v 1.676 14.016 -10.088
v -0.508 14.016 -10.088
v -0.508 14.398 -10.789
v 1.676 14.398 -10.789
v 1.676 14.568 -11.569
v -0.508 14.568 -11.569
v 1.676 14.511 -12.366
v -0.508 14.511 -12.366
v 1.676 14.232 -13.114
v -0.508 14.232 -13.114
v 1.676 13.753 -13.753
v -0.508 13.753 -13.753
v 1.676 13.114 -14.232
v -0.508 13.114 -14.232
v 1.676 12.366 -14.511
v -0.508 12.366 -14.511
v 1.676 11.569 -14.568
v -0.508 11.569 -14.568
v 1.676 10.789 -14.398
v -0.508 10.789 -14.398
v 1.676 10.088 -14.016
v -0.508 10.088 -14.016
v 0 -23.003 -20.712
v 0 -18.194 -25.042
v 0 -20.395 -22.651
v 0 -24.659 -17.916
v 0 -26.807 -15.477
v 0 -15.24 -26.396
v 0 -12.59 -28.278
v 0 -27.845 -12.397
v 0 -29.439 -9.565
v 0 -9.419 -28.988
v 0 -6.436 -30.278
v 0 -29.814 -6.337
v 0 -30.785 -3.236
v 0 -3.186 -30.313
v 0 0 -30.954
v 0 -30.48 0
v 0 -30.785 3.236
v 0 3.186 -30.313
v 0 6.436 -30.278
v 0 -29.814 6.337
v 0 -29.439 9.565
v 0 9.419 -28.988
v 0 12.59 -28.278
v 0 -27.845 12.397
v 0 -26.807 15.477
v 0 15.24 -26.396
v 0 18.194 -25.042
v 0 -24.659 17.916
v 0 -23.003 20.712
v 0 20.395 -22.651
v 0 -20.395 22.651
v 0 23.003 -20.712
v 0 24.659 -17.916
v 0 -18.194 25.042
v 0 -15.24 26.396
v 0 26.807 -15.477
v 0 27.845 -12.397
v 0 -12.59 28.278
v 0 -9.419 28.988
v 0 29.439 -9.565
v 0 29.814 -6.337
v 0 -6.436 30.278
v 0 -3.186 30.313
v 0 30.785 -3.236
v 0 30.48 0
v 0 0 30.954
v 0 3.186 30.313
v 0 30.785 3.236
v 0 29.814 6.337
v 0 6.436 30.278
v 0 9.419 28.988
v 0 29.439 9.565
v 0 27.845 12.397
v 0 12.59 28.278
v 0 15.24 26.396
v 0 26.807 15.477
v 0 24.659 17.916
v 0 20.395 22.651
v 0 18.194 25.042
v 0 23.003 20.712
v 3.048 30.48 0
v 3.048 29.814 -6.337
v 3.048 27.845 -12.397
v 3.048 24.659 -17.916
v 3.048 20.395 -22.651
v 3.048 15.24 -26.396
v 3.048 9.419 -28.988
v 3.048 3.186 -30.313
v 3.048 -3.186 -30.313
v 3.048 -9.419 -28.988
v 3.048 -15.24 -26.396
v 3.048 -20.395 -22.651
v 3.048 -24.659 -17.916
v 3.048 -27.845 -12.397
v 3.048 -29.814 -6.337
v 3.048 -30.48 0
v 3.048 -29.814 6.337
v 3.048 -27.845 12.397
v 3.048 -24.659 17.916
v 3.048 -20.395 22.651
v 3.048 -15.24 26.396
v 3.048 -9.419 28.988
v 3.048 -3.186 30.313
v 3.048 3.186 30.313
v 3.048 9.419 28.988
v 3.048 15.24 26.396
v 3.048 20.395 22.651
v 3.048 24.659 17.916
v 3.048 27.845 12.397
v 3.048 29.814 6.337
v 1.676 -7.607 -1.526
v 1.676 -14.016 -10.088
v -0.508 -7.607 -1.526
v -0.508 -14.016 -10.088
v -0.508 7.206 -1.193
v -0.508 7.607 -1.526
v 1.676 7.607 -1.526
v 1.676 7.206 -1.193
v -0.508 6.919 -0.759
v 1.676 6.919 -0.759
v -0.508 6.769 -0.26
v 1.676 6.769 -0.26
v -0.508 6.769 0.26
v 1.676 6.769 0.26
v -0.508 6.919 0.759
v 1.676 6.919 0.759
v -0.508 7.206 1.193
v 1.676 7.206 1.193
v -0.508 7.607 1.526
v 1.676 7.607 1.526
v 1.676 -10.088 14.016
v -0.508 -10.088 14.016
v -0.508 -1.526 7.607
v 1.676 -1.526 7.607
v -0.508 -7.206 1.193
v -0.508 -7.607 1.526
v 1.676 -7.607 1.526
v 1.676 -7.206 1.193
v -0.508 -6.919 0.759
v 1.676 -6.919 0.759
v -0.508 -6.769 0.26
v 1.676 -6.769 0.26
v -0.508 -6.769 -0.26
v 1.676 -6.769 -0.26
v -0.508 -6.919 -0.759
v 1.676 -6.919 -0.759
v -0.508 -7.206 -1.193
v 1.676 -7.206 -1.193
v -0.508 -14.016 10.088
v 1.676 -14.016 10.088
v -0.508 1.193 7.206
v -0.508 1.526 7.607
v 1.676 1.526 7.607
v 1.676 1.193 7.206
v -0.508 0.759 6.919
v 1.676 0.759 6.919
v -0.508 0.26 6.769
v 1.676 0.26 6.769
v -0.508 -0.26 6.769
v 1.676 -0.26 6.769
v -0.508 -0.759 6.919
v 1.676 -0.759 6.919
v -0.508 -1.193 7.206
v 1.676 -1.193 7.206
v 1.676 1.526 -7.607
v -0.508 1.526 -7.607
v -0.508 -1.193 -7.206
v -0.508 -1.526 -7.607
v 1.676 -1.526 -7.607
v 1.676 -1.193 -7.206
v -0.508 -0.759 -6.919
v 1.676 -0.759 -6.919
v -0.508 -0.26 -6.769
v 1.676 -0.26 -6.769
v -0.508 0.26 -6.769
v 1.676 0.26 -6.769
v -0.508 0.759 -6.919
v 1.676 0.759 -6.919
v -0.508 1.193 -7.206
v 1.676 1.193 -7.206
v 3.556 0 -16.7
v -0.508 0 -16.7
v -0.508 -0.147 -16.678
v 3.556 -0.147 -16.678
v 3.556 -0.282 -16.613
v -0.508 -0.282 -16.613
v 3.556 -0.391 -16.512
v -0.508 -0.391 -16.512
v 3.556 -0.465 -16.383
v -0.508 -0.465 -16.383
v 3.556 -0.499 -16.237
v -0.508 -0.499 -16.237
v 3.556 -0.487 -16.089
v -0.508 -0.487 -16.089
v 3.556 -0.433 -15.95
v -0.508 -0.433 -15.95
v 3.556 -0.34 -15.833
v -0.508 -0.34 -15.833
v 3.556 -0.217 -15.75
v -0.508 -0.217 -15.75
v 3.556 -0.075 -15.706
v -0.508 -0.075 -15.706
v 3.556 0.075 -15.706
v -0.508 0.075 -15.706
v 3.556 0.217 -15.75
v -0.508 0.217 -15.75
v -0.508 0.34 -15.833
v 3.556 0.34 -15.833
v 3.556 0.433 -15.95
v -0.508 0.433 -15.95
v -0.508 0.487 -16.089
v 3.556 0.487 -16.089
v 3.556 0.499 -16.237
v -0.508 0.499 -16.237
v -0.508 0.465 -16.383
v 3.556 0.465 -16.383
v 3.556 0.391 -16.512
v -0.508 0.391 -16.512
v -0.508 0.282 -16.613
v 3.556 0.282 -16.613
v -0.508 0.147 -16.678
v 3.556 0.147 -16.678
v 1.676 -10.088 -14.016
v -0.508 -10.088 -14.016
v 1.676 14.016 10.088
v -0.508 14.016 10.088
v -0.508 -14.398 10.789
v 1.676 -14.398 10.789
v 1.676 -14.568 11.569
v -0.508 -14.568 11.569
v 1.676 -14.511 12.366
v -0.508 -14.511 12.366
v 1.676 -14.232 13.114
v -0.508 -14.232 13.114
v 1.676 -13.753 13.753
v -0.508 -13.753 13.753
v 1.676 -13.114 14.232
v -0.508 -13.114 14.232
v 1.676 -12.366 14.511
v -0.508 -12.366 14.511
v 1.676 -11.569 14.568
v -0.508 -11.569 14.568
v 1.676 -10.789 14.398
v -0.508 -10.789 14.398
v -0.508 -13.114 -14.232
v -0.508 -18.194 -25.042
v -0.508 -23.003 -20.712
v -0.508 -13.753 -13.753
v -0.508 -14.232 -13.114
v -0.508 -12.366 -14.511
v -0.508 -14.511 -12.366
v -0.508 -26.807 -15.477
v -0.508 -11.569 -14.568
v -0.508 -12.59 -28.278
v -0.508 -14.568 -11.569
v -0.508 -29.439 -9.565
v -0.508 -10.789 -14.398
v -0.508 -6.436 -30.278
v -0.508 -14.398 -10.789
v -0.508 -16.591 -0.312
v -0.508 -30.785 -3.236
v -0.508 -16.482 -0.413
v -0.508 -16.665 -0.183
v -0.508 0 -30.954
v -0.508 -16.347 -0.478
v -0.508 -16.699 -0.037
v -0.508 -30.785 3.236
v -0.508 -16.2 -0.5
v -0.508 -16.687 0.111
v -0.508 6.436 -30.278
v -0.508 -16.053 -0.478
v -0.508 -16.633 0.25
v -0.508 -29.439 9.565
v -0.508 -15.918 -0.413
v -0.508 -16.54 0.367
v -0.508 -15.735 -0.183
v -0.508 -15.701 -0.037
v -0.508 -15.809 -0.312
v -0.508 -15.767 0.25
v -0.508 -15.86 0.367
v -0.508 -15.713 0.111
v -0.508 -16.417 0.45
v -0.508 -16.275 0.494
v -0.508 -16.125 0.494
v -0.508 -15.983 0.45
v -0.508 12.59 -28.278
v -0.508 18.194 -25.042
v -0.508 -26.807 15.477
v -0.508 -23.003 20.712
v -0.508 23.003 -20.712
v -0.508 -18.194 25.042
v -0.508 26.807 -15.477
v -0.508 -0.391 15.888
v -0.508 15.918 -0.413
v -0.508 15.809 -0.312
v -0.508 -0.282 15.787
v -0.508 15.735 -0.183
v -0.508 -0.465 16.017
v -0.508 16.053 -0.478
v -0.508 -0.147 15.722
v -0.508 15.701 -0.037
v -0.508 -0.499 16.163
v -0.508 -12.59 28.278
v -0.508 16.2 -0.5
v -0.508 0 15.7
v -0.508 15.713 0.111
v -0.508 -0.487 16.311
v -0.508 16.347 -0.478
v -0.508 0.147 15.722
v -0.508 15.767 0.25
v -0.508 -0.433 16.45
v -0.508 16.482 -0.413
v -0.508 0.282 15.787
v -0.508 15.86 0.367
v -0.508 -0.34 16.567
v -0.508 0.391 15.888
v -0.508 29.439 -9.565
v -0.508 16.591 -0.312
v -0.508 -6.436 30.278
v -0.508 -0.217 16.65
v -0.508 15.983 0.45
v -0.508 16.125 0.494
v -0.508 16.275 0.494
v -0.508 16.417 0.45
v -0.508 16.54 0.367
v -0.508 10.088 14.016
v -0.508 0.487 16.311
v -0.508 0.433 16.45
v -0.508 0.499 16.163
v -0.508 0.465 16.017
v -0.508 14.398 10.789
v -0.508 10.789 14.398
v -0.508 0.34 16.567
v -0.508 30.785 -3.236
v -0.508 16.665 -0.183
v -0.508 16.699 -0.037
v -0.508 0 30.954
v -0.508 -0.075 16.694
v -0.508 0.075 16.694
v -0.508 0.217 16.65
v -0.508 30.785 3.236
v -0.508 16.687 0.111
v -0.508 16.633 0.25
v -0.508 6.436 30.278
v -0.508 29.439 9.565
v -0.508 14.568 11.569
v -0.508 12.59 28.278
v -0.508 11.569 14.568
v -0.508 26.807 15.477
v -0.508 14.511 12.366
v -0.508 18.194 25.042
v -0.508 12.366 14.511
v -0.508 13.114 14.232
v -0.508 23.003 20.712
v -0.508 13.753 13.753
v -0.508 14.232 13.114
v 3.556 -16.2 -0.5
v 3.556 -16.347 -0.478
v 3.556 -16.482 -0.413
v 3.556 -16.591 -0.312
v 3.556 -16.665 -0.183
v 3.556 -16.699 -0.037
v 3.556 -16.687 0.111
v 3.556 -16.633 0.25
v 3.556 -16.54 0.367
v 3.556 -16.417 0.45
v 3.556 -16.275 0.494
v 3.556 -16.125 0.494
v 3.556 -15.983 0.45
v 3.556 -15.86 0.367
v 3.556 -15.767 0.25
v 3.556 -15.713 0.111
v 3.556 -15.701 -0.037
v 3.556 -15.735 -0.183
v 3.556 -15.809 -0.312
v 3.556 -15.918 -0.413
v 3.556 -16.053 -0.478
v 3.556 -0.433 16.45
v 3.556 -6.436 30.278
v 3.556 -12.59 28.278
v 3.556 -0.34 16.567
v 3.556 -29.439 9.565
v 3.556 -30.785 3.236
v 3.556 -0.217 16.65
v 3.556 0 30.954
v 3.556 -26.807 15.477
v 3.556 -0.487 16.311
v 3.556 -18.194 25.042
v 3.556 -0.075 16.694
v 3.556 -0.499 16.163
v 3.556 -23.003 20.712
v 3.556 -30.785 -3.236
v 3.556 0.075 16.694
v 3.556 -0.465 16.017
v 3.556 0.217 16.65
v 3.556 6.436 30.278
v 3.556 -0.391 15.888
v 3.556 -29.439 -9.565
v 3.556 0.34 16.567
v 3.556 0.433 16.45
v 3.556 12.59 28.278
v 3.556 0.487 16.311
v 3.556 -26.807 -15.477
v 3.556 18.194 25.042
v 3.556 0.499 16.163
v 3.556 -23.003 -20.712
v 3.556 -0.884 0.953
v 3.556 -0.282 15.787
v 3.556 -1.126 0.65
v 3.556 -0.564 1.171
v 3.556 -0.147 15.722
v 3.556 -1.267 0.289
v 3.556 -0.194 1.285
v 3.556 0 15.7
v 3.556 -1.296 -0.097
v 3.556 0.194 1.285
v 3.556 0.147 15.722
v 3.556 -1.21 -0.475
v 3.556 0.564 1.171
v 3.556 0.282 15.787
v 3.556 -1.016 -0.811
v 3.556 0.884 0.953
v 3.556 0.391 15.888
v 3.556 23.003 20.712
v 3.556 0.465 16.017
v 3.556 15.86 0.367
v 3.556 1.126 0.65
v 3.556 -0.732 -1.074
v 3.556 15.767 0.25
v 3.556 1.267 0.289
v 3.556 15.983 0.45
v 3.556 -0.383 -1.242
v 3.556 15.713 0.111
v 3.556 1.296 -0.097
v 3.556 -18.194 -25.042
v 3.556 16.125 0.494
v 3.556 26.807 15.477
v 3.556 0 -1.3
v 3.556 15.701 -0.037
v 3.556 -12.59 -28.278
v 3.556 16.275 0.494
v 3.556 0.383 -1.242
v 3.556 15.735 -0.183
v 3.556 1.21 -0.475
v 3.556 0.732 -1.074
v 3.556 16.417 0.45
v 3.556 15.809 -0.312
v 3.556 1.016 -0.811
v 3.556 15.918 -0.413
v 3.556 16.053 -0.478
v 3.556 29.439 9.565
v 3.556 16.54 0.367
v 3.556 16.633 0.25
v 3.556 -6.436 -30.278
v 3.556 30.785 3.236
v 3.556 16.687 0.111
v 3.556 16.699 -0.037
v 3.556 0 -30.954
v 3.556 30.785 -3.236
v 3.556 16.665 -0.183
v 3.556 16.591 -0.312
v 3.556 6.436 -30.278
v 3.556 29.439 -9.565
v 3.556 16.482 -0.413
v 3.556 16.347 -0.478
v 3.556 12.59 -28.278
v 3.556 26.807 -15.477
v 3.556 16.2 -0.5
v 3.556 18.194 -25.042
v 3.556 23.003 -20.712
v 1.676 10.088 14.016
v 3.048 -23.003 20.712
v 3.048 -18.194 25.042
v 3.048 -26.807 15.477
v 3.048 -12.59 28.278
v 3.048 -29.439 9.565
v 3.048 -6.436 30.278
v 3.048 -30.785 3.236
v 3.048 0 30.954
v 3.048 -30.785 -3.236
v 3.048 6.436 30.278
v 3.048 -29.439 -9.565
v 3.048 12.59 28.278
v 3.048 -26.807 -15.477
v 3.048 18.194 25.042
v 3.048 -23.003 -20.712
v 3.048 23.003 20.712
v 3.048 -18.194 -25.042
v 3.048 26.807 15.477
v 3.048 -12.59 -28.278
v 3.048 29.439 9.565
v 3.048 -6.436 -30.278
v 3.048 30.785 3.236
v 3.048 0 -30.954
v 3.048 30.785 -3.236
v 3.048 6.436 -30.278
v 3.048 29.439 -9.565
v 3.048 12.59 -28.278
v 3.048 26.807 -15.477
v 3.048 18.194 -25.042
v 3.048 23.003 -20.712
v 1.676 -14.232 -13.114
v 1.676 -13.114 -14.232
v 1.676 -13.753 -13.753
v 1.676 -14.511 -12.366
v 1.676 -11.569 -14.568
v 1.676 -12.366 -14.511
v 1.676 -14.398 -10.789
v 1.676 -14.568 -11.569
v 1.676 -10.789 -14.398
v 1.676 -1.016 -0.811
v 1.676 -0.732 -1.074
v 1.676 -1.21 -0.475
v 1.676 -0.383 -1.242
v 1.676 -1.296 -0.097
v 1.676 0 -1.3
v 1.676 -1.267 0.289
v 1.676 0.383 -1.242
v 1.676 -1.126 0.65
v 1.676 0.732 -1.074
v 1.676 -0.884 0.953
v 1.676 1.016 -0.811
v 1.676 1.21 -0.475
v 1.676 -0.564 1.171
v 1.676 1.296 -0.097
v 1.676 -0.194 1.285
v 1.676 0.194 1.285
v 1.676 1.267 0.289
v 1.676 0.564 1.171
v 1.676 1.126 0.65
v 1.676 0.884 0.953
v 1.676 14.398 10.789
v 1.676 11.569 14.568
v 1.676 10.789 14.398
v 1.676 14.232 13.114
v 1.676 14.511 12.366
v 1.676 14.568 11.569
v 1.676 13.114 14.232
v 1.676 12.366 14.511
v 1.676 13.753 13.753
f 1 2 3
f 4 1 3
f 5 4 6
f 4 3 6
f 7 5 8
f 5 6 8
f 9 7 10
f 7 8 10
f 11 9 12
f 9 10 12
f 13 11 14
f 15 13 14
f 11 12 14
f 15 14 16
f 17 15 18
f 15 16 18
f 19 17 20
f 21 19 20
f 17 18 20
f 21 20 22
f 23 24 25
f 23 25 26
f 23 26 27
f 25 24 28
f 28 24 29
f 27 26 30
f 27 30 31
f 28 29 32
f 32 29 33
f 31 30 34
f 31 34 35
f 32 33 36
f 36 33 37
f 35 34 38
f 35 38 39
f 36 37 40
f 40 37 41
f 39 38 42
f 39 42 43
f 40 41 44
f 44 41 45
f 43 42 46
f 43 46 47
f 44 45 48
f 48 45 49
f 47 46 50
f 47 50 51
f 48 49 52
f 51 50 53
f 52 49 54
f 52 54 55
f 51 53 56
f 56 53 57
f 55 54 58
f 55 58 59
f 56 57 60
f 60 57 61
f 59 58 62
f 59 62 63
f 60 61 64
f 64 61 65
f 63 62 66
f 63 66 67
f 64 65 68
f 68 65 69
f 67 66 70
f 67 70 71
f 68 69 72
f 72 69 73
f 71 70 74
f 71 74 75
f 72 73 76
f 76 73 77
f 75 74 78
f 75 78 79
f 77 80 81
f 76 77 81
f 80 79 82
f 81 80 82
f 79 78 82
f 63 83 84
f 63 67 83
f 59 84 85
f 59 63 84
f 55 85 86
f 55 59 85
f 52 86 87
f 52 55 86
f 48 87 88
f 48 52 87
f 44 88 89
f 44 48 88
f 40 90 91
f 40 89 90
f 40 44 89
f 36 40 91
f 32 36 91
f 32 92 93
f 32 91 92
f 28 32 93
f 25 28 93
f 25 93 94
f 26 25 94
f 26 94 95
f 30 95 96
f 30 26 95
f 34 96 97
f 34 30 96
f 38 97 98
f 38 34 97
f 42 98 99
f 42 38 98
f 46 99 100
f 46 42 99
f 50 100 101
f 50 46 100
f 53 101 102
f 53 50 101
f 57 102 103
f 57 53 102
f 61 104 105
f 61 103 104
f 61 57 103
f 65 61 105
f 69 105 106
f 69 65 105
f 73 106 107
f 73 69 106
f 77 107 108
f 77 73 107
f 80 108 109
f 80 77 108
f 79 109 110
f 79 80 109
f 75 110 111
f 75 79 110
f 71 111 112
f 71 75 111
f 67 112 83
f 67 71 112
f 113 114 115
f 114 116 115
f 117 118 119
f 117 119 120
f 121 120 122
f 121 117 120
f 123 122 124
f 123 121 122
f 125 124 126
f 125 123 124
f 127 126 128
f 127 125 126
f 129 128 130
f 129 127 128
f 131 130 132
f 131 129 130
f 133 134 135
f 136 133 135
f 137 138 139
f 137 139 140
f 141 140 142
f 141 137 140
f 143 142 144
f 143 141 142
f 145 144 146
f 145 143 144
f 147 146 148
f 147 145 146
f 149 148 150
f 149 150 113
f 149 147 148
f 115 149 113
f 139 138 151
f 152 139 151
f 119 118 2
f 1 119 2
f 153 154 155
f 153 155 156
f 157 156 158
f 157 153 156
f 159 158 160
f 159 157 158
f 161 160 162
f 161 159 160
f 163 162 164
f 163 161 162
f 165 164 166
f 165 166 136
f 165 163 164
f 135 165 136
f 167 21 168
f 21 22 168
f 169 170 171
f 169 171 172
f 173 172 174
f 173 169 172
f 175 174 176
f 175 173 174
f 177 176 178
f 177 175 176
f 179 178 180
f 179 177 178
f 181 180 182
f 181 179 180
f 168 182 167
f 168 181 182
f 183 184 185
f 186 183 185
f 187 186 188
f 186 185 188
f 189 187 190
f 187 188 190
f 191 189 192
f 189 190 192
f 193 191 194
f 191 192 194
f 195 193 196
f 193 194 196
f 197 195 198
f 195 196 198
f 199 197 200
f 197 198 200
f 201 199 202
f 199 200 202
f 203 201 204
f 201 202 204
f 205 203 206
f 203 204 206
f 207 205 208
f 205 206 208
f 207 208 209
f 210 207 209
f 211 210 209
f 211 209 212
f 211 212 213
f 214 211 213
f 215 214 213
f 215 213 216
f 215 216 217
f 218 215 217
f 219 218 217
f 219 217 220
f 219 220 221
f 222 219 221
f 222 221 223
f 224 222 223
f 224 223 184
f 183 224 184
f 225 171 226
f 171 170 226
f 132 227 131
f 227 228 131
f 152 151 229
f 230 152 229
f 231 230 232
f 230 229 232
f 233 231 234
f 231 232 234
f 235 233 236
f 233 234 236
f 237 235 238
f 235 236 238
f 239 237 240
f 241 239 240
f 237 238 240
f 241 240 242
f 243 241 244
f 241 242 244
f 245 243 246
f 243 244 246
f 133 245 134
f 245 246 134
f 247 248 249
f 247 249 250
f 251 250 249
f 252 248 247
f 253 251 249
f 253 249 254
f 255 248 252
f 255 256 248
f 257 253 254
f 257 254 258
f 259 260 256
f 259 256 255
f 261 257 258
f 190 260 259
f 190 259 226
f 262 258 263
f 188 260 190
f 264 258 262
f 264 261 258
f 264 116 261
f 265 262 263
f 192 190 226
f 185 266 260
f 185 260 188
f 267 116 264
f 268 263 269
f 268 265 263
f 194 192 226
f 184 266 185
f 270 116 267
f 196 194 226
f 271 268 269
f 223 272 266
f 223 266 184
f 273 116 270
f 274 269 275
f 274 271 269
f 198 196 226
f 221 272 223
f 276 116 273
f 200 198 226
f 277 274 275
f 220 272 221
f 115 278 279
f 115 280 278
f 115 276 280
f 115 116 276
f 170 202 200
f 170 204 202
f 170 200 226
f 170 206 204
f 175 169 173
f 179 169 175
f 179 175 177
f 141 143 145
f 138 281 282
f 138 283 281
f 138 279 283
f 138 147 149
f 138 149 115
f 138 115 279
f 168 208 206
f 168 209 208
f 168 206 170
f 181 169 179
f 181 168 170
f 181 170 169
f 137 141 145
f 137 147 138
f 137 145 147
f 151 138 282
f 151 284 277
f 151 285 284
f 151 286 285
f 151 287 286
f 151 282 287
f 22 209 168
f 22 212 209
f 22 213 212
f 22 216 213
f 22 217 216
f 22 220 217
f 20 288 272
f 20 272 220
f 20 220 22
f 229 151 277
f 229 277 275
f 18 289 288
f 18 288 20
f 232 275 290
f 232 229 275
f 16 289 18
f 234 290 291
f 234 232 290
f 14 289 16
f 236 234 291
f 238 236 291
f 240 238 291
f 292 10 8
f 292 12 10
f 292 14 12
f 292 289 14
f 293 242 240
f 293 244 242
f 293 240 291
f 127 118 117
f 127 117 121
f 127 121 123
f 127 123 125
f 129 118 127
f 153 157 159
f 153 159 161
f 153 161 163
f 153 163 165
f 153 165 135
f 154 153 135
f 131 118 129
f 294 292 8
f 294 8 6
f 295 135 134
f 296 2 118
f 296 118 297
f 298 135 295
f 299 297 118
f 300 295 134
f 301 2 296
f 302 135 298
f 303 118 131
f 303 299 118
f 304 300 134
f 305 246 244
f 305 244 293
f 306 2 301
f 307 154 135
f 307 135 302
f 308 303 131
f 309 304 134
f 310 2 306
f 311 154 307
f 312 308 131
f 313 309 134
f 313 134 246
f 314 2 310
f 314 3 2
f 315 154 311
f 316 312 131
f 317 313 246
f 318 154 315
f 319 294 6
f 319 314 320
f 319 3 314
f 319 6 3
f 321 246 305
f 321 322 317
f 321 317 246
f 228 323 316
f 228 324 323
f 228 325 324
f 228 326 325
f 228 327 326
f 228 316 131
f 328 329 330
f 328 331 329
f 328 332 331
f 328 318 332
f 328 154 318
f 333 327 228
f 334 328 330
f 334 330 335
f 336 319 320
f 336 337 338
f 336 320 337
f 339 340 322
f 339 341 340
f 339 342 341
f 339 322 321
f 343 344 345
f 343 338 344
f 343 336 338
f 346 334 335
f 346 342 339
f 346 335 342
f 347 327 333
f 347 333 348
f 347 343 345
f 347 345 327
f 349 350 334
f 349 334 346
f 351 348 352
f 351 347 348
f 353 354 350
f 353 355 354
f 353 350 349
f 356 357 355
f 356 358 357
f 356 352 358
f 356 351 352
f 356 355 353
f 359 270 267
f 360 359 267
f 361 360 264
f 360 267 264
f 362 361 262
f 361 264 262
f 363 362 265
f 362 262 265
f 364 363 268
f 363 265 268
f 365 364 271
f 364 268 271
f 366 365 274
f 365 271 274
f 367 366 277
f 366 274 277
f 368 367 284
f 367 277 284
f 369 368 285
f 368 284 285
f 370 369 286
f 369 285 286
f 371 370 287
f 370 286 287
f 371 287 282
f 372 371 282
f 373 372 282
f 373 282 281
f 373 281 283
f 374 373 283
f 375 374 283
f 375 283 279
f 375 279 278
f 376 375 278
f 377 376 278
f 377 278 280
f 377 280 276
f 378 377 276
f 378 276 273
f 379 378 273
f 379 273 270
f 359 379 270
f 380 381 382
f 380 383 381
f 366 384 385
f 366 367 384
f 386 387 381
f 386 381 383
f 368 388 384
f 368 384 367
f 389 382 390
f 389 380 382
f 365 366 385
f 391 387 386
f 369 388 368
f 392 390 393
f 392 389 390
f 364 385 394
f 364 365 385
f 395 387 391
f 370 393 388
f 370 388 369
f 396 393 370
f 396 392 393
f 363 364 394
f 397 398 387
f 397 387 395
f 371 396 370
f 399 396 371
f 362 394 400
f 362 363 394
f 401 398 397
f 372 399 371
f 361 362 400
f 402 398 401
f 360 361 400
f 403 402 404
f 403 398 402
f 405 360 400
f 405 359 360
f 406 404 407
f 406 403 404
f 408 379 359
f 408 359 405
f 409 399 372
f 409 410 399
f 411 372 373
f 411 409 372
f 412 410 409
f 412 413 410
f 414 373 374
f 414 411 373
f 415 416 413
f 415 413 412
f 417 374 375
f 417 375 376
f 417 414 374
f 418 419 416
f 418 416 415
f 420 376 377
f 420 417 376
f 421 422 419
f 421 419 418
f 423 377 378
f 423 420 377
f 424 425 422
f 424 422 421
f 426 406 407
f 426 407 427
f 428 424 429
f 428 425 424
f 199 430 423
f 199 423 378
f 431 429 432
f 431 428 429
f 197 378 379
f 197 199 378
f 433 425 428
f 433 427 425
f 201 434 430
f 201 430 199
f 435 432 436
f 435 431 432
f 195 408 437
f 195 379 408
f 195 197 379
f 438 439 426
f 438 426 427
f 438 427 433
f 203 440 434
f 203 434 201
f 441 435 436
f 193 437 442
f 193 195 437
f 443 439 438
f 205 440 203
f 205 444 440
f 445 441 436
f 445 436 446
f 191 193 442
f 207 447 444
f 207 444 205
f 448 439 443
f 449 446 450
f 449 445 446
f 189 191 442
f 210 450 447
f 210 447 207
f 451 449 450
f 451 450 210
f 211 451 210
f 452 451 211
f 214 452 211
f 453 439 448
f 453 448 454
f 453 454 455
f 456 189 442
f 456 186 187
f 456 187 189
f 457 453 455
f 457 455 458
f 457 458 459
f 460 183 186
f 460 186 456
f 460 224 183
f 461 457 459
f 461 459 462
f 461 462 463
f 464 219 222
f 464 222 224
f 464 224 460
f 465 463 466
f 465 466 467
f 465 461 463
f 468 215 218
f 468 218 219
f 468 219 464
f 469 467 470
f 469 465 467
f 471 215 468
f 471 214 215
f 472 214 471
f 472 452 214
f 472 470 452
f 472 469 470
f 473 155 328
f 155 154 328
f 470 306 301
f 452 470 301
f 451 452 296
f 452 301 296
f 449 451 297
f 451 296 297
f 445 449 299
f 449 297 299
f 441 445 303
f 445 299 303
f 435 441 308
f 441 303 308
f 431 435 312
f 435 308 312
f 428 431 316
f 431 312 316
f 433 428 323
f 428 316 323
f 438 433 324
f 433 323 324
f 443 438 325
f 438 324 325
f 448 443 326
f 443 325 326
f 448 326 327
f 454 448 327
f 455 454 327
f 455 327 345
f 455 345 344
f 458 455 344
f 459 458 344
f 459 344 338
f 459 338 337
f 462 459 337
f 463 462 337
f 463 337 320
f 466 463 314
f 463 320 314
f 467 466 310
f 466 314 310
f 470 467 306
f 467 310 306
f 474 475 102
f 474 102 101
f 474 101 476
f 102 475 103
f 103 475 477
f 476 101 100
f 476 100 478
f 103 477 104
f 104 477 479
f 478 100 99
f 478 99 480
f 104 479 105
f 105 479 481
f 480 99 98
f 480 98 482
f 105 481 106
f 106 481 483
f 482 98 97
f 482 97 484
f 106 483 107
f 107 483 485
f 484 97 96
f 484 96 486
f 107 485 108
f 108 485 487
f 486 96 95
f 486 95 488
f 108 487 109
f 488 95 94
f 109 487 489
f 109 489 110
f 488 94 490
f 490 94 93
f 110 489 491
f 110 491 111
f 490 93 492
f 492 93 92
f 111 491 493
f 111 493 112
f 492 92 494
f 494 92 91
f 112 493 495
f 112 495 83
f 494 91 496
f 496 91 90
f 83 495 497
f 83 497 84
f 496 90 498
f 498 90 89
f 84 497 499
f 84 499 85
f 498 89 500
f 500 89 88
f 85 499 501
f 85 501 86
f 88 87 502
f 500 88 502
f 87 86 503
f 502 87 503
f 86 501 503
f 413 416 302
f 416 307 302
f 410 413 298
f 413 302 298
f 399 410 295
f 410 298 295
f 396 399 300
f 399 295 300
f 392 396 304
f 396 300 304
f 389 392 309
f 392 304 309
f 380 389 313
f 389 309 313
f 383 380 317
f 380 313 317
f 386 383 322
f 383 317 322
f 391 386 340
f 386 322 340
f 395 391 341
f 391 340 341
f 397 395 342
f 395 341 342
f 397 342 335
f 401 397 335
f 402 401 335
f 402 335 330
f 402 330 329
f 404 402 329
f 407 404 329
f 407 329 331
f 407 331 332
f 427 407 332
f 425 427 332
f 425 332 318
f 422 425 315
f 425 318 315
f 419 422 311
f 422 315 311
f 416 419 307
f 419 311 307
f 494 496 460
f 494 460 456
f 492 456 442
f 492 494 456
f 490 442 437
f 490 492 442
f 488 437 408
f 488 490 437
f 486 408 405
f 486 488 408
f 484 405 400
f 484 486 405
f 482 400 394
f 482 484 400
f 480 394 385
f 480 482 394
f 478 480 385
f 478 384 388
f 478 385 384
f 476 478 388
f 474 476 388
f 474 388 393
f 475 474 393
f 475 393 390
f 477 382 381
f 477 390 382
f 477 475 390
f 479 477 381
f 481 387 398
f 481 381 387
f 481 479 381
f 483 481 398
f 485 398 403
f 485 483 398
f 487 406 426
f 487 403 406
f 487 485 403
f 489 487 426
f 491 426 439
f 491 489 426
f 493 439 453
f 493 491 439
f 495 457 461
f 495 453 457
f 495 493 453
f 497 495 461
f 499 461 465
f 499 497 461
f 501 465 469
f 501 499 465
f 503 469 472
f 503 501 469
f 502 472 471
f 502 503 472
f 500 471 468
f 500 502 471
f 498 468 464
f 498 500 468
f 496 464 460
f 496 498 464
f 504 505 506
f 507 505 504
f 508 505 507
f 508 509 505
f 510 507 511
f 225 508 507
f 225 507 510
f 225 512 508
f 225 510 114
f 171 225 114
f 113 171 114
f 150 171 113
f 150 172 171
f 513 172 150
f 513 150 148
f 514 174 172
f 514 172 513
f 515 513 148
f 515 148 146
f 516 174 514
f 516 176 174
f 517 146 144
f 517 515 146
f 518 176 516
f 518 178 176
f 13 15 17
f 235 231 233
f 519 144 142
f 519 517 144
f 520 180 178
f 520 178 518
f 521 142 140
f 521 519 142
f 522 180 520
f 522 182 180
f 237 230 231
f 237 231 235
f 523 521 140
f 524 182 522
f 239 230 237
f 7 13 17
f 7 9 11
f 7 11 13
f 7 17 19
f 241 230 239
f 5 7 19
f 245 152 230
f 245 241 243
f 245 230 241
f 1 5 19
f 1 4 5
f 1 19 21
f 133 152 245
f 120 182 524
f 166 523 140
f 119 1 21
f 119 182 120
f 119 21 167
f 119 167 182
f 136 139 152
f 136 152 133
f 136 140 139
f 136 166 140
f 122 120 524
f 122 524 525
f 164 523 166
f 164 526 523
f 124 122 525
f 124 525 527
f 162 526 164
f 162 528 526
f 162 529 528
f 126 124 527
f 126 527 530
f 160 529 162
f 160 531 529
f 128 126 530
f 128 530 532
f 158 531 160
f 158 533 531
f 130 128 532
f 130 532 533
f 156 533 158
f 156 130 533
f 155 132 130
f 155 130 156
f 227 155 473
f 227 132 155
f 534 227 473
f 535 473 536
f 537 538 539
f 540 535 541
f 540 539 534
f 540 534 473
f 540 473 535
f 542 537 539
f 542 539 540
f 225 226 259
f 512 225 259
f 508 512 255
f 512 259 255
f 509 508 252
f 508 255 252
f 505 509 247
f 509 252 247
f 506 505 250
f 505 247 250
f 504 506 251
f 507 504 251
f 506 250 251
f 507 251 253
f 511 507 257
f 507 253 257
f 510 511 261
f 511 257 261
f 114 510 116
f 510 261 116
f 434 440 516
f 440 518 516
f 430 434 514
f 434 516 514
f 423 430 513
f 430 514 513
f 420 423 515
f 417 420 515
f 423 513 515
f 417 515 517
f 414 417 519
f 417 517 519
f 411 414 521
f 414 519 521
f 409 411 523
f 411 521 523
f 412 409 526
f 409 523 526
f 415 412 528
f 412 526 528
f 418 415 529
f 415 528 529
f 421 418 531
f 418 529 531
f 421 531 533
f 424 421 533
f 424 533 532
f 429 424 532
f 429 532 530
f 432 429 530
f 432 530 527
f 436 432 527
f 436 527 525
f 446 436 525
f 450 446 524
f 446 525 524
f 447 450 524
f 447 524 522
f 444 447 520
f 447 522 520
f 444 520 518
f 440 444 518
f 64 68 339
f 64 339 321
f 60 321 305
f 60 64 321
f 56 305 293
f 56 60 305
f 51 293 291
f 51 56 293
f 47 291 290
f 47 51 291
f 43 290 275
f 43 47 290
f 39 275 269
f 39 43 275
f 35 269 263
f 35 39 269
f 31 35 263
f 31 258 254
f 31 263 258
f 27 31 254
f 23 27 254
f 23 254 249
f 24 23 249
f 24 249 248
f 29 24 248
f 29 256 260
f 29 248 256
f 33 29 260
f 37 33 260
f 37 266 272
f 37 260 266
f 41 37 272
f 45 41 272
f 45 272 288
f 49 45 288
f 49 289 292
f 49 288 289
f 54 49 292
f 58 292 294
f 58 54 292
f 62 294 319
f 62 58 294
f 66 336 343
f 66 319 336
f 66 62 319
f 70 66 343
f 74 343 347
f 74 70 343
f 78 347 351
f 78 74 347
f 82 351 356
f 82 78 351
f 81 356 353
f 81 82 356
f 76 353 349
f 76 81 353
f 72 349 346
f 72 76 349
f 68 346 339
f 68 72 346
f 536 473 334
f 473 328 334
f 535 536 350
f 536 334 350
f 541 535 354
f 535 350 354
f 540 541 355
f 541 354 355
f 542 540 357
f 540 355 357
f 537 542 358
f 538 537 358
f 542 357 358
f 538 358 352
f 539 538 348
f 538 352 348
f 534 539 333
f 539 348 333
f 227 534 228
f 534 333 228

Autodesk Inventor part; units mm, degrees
ref_plane "YZ Plane" through (0, 0, 0) normal (1, 0, 0) x (0, 1, 0)
ref_plane "XZ Plane" through (0, 0, 0) normal (0, 1, 0) x (-1, 0, 0)
ref_plane "XY Plane" through (0, 0, 0) normal (0, 0, 1) x (1, 0, 0)
sketch "Sketch1" plane through (0, 0, 0) normal (1, 0, 0) x (0, 1, 0)
  circle A0 centre (0, 0) radius 30.48
  dimension "d0" = 60.96
extrude "Extrusion1" add sketch "Sketch1" along normal blind 3.048
sketch "Sketch2" plane through (3.048, 0, 0) normal (1, 0, 0) x (0, 0, -1)
  circle A0 centre (0, 0) radius 30.9541
extrude "Extrusion2" add sketch "Sketch2" along normal blind 0.508
sketch "Sketch3" plane through (0, 0, 0) normal (-1, 0, 0) x (0, 0, 1)
  circle A0 centre (0, 0) radius 30.9541
extrude "Extrusion3" add sketch "Sketch3" along normal blind 0.508
sketch "Sketch4" plane through (3.556, 0, 0) normal (1, 0, 0) x (0, 0, -1)
  circle A0 centre (0, 0) radius 1.3
  dimension "d7" = 2.6
hole "Hole1" at (3.556, 0, 0) direction (-1, 0, 0) diameter 2.6 end through all
sketch "Sketch5" plane through (3.556, 0, 0) normal (1, 0, 0) x (0, 0, -1)
  circle A0 centre (0, 0) radius 1.3 projected
  circle A1 centre (-16.2, 0) radius 0.5
  circle A2 centre (0, 16.2) radius 0.5
  circle A3 centre (16.2, 0) radius 0.5
  circle A4 centre (0, -16.2) radius 0.5
  dimension "d19" = 1
  dimension "d20" = 1
  dimension "d21" = 1
  dimension "d22" = 1
hole "Hole2" at (3.556, 16.2, 0) at (3.556, -16.2, 0) at (3.556, 0, -16.2) at (3.556, 0, 16.2) direction (-1, 0, 0) diameter 1 end through all
sketch "Sketch6" plane through (-0.508, 0, 0) normal (-1, 0, 0) x (0, 0, 1)
  arc A0 (1.5256, -7.6067) -> (-1.5256, -7.6067) centre (0, -8.5367) ccw
  line L0 (1.5256, -7.6067) -> (10.0877, -14.0155)
  arc A1 (10.0877, -14.0155) -> (14.0155, -10.0877) centre (11.7691, -11.7691) ccw
  line L1 (14.0155, -10.0877) -> (7.6067, -1.5256)
  arc A2 (7.6067, 1.5256) -> (7.6067, -1.5256) centre (8.5367, 0) ccw
  line L2 (7.6067, 1.5256) -> (14.0155, 10.0877)
  arc A3 (14.0155, 10.0877) -> (10.0877, 14.0155) centre (11.7691, 11.7691) ccw
  line L3 (10.0877, 14.0155) -> (1.5256, 7.6067)
  arc A4 (-1.5256, 7.6067) -> (1.5256, 7.6067) centre (0, 8.5367) ccw
  line L4 (-1.5256, 7.6067) -> (-10.0877, 14.0155)
  arc A5 (-10.0877, 14.0155) -> (-14.0155, 10.0877) centre (-11.7691, 11.7691) ccw
  line L5 (-14.0155, 10.0877) -> (-7.6067, 1.5256)
  arc A6 (-7.6067, -1.5256) -> (-7.6067, 1.5256) centre (-8.5367, 0) ccw
  line L6 (-7.6067, -1.5256) -> (-14.0155, -10.0877)
  arc A7 (-14.0155, -10.0877) -> (-10.0877, -14.0155) centre (-11.7691, -11.7691) ccw
  line L7 (-10.0877, -14.0155) -> (-1.5256, -7.6067)
  circle A8 centre (12.339, -12.339) radius 0.75
  circle A9 centre (9.8641, -9.8641) radius 0.75
  circle A10 centre (7.3893, -7.3893) radius 0.75
  circle A11 centre (4.9144, -4.9144) radius 0.75
  circle A12 centre (12.339, 12.339) radius 0.75
  circle A13 centre (9.8641, 9.8641) radius 0.75
  circle A14 centre (7.3893, 7.3893) radius 0.75
  circle A15 centre (4.9144, 4.9144) radius 0.75
  circle A16 centre (-12.339, 12.339) radius 0.75
  circle A17 centre (-9.8641, 9.8641) radius 0.75
  circle A18 centre (-7.3893, 7.3893) radius 0.75
  circle A19 centre (-4.9144, 4.9144) radius 0.75
  circle A20 centre (-12.339, -12.339) radius 0.75
  circle A21 centre (-9.8641, -9.8641) radius 0.75
  circle A22 centre (-7.3893, -7.3893) radius 0.75
  circle A23 centre (-4.9144, -4.9144) radius 0.75
  circle A24 centre (0, 0) radius 3.6
  point P0 (0, 0)
extrude "Extrusion4" cut sketch "Sketch6" against normal blind 2.1844 contours A0 L7 A7 L6 A6 L5 A5 L4 A4 L3 A3 L2 A2 L1 A1 L0 | A8 | A9 | A10 | A11 | A12 | A13 | A14 | A15 | A16 | A17 | A18 | A19 | A20 | A21 | A22 | A23 | A24
properties part number "Wheel"
